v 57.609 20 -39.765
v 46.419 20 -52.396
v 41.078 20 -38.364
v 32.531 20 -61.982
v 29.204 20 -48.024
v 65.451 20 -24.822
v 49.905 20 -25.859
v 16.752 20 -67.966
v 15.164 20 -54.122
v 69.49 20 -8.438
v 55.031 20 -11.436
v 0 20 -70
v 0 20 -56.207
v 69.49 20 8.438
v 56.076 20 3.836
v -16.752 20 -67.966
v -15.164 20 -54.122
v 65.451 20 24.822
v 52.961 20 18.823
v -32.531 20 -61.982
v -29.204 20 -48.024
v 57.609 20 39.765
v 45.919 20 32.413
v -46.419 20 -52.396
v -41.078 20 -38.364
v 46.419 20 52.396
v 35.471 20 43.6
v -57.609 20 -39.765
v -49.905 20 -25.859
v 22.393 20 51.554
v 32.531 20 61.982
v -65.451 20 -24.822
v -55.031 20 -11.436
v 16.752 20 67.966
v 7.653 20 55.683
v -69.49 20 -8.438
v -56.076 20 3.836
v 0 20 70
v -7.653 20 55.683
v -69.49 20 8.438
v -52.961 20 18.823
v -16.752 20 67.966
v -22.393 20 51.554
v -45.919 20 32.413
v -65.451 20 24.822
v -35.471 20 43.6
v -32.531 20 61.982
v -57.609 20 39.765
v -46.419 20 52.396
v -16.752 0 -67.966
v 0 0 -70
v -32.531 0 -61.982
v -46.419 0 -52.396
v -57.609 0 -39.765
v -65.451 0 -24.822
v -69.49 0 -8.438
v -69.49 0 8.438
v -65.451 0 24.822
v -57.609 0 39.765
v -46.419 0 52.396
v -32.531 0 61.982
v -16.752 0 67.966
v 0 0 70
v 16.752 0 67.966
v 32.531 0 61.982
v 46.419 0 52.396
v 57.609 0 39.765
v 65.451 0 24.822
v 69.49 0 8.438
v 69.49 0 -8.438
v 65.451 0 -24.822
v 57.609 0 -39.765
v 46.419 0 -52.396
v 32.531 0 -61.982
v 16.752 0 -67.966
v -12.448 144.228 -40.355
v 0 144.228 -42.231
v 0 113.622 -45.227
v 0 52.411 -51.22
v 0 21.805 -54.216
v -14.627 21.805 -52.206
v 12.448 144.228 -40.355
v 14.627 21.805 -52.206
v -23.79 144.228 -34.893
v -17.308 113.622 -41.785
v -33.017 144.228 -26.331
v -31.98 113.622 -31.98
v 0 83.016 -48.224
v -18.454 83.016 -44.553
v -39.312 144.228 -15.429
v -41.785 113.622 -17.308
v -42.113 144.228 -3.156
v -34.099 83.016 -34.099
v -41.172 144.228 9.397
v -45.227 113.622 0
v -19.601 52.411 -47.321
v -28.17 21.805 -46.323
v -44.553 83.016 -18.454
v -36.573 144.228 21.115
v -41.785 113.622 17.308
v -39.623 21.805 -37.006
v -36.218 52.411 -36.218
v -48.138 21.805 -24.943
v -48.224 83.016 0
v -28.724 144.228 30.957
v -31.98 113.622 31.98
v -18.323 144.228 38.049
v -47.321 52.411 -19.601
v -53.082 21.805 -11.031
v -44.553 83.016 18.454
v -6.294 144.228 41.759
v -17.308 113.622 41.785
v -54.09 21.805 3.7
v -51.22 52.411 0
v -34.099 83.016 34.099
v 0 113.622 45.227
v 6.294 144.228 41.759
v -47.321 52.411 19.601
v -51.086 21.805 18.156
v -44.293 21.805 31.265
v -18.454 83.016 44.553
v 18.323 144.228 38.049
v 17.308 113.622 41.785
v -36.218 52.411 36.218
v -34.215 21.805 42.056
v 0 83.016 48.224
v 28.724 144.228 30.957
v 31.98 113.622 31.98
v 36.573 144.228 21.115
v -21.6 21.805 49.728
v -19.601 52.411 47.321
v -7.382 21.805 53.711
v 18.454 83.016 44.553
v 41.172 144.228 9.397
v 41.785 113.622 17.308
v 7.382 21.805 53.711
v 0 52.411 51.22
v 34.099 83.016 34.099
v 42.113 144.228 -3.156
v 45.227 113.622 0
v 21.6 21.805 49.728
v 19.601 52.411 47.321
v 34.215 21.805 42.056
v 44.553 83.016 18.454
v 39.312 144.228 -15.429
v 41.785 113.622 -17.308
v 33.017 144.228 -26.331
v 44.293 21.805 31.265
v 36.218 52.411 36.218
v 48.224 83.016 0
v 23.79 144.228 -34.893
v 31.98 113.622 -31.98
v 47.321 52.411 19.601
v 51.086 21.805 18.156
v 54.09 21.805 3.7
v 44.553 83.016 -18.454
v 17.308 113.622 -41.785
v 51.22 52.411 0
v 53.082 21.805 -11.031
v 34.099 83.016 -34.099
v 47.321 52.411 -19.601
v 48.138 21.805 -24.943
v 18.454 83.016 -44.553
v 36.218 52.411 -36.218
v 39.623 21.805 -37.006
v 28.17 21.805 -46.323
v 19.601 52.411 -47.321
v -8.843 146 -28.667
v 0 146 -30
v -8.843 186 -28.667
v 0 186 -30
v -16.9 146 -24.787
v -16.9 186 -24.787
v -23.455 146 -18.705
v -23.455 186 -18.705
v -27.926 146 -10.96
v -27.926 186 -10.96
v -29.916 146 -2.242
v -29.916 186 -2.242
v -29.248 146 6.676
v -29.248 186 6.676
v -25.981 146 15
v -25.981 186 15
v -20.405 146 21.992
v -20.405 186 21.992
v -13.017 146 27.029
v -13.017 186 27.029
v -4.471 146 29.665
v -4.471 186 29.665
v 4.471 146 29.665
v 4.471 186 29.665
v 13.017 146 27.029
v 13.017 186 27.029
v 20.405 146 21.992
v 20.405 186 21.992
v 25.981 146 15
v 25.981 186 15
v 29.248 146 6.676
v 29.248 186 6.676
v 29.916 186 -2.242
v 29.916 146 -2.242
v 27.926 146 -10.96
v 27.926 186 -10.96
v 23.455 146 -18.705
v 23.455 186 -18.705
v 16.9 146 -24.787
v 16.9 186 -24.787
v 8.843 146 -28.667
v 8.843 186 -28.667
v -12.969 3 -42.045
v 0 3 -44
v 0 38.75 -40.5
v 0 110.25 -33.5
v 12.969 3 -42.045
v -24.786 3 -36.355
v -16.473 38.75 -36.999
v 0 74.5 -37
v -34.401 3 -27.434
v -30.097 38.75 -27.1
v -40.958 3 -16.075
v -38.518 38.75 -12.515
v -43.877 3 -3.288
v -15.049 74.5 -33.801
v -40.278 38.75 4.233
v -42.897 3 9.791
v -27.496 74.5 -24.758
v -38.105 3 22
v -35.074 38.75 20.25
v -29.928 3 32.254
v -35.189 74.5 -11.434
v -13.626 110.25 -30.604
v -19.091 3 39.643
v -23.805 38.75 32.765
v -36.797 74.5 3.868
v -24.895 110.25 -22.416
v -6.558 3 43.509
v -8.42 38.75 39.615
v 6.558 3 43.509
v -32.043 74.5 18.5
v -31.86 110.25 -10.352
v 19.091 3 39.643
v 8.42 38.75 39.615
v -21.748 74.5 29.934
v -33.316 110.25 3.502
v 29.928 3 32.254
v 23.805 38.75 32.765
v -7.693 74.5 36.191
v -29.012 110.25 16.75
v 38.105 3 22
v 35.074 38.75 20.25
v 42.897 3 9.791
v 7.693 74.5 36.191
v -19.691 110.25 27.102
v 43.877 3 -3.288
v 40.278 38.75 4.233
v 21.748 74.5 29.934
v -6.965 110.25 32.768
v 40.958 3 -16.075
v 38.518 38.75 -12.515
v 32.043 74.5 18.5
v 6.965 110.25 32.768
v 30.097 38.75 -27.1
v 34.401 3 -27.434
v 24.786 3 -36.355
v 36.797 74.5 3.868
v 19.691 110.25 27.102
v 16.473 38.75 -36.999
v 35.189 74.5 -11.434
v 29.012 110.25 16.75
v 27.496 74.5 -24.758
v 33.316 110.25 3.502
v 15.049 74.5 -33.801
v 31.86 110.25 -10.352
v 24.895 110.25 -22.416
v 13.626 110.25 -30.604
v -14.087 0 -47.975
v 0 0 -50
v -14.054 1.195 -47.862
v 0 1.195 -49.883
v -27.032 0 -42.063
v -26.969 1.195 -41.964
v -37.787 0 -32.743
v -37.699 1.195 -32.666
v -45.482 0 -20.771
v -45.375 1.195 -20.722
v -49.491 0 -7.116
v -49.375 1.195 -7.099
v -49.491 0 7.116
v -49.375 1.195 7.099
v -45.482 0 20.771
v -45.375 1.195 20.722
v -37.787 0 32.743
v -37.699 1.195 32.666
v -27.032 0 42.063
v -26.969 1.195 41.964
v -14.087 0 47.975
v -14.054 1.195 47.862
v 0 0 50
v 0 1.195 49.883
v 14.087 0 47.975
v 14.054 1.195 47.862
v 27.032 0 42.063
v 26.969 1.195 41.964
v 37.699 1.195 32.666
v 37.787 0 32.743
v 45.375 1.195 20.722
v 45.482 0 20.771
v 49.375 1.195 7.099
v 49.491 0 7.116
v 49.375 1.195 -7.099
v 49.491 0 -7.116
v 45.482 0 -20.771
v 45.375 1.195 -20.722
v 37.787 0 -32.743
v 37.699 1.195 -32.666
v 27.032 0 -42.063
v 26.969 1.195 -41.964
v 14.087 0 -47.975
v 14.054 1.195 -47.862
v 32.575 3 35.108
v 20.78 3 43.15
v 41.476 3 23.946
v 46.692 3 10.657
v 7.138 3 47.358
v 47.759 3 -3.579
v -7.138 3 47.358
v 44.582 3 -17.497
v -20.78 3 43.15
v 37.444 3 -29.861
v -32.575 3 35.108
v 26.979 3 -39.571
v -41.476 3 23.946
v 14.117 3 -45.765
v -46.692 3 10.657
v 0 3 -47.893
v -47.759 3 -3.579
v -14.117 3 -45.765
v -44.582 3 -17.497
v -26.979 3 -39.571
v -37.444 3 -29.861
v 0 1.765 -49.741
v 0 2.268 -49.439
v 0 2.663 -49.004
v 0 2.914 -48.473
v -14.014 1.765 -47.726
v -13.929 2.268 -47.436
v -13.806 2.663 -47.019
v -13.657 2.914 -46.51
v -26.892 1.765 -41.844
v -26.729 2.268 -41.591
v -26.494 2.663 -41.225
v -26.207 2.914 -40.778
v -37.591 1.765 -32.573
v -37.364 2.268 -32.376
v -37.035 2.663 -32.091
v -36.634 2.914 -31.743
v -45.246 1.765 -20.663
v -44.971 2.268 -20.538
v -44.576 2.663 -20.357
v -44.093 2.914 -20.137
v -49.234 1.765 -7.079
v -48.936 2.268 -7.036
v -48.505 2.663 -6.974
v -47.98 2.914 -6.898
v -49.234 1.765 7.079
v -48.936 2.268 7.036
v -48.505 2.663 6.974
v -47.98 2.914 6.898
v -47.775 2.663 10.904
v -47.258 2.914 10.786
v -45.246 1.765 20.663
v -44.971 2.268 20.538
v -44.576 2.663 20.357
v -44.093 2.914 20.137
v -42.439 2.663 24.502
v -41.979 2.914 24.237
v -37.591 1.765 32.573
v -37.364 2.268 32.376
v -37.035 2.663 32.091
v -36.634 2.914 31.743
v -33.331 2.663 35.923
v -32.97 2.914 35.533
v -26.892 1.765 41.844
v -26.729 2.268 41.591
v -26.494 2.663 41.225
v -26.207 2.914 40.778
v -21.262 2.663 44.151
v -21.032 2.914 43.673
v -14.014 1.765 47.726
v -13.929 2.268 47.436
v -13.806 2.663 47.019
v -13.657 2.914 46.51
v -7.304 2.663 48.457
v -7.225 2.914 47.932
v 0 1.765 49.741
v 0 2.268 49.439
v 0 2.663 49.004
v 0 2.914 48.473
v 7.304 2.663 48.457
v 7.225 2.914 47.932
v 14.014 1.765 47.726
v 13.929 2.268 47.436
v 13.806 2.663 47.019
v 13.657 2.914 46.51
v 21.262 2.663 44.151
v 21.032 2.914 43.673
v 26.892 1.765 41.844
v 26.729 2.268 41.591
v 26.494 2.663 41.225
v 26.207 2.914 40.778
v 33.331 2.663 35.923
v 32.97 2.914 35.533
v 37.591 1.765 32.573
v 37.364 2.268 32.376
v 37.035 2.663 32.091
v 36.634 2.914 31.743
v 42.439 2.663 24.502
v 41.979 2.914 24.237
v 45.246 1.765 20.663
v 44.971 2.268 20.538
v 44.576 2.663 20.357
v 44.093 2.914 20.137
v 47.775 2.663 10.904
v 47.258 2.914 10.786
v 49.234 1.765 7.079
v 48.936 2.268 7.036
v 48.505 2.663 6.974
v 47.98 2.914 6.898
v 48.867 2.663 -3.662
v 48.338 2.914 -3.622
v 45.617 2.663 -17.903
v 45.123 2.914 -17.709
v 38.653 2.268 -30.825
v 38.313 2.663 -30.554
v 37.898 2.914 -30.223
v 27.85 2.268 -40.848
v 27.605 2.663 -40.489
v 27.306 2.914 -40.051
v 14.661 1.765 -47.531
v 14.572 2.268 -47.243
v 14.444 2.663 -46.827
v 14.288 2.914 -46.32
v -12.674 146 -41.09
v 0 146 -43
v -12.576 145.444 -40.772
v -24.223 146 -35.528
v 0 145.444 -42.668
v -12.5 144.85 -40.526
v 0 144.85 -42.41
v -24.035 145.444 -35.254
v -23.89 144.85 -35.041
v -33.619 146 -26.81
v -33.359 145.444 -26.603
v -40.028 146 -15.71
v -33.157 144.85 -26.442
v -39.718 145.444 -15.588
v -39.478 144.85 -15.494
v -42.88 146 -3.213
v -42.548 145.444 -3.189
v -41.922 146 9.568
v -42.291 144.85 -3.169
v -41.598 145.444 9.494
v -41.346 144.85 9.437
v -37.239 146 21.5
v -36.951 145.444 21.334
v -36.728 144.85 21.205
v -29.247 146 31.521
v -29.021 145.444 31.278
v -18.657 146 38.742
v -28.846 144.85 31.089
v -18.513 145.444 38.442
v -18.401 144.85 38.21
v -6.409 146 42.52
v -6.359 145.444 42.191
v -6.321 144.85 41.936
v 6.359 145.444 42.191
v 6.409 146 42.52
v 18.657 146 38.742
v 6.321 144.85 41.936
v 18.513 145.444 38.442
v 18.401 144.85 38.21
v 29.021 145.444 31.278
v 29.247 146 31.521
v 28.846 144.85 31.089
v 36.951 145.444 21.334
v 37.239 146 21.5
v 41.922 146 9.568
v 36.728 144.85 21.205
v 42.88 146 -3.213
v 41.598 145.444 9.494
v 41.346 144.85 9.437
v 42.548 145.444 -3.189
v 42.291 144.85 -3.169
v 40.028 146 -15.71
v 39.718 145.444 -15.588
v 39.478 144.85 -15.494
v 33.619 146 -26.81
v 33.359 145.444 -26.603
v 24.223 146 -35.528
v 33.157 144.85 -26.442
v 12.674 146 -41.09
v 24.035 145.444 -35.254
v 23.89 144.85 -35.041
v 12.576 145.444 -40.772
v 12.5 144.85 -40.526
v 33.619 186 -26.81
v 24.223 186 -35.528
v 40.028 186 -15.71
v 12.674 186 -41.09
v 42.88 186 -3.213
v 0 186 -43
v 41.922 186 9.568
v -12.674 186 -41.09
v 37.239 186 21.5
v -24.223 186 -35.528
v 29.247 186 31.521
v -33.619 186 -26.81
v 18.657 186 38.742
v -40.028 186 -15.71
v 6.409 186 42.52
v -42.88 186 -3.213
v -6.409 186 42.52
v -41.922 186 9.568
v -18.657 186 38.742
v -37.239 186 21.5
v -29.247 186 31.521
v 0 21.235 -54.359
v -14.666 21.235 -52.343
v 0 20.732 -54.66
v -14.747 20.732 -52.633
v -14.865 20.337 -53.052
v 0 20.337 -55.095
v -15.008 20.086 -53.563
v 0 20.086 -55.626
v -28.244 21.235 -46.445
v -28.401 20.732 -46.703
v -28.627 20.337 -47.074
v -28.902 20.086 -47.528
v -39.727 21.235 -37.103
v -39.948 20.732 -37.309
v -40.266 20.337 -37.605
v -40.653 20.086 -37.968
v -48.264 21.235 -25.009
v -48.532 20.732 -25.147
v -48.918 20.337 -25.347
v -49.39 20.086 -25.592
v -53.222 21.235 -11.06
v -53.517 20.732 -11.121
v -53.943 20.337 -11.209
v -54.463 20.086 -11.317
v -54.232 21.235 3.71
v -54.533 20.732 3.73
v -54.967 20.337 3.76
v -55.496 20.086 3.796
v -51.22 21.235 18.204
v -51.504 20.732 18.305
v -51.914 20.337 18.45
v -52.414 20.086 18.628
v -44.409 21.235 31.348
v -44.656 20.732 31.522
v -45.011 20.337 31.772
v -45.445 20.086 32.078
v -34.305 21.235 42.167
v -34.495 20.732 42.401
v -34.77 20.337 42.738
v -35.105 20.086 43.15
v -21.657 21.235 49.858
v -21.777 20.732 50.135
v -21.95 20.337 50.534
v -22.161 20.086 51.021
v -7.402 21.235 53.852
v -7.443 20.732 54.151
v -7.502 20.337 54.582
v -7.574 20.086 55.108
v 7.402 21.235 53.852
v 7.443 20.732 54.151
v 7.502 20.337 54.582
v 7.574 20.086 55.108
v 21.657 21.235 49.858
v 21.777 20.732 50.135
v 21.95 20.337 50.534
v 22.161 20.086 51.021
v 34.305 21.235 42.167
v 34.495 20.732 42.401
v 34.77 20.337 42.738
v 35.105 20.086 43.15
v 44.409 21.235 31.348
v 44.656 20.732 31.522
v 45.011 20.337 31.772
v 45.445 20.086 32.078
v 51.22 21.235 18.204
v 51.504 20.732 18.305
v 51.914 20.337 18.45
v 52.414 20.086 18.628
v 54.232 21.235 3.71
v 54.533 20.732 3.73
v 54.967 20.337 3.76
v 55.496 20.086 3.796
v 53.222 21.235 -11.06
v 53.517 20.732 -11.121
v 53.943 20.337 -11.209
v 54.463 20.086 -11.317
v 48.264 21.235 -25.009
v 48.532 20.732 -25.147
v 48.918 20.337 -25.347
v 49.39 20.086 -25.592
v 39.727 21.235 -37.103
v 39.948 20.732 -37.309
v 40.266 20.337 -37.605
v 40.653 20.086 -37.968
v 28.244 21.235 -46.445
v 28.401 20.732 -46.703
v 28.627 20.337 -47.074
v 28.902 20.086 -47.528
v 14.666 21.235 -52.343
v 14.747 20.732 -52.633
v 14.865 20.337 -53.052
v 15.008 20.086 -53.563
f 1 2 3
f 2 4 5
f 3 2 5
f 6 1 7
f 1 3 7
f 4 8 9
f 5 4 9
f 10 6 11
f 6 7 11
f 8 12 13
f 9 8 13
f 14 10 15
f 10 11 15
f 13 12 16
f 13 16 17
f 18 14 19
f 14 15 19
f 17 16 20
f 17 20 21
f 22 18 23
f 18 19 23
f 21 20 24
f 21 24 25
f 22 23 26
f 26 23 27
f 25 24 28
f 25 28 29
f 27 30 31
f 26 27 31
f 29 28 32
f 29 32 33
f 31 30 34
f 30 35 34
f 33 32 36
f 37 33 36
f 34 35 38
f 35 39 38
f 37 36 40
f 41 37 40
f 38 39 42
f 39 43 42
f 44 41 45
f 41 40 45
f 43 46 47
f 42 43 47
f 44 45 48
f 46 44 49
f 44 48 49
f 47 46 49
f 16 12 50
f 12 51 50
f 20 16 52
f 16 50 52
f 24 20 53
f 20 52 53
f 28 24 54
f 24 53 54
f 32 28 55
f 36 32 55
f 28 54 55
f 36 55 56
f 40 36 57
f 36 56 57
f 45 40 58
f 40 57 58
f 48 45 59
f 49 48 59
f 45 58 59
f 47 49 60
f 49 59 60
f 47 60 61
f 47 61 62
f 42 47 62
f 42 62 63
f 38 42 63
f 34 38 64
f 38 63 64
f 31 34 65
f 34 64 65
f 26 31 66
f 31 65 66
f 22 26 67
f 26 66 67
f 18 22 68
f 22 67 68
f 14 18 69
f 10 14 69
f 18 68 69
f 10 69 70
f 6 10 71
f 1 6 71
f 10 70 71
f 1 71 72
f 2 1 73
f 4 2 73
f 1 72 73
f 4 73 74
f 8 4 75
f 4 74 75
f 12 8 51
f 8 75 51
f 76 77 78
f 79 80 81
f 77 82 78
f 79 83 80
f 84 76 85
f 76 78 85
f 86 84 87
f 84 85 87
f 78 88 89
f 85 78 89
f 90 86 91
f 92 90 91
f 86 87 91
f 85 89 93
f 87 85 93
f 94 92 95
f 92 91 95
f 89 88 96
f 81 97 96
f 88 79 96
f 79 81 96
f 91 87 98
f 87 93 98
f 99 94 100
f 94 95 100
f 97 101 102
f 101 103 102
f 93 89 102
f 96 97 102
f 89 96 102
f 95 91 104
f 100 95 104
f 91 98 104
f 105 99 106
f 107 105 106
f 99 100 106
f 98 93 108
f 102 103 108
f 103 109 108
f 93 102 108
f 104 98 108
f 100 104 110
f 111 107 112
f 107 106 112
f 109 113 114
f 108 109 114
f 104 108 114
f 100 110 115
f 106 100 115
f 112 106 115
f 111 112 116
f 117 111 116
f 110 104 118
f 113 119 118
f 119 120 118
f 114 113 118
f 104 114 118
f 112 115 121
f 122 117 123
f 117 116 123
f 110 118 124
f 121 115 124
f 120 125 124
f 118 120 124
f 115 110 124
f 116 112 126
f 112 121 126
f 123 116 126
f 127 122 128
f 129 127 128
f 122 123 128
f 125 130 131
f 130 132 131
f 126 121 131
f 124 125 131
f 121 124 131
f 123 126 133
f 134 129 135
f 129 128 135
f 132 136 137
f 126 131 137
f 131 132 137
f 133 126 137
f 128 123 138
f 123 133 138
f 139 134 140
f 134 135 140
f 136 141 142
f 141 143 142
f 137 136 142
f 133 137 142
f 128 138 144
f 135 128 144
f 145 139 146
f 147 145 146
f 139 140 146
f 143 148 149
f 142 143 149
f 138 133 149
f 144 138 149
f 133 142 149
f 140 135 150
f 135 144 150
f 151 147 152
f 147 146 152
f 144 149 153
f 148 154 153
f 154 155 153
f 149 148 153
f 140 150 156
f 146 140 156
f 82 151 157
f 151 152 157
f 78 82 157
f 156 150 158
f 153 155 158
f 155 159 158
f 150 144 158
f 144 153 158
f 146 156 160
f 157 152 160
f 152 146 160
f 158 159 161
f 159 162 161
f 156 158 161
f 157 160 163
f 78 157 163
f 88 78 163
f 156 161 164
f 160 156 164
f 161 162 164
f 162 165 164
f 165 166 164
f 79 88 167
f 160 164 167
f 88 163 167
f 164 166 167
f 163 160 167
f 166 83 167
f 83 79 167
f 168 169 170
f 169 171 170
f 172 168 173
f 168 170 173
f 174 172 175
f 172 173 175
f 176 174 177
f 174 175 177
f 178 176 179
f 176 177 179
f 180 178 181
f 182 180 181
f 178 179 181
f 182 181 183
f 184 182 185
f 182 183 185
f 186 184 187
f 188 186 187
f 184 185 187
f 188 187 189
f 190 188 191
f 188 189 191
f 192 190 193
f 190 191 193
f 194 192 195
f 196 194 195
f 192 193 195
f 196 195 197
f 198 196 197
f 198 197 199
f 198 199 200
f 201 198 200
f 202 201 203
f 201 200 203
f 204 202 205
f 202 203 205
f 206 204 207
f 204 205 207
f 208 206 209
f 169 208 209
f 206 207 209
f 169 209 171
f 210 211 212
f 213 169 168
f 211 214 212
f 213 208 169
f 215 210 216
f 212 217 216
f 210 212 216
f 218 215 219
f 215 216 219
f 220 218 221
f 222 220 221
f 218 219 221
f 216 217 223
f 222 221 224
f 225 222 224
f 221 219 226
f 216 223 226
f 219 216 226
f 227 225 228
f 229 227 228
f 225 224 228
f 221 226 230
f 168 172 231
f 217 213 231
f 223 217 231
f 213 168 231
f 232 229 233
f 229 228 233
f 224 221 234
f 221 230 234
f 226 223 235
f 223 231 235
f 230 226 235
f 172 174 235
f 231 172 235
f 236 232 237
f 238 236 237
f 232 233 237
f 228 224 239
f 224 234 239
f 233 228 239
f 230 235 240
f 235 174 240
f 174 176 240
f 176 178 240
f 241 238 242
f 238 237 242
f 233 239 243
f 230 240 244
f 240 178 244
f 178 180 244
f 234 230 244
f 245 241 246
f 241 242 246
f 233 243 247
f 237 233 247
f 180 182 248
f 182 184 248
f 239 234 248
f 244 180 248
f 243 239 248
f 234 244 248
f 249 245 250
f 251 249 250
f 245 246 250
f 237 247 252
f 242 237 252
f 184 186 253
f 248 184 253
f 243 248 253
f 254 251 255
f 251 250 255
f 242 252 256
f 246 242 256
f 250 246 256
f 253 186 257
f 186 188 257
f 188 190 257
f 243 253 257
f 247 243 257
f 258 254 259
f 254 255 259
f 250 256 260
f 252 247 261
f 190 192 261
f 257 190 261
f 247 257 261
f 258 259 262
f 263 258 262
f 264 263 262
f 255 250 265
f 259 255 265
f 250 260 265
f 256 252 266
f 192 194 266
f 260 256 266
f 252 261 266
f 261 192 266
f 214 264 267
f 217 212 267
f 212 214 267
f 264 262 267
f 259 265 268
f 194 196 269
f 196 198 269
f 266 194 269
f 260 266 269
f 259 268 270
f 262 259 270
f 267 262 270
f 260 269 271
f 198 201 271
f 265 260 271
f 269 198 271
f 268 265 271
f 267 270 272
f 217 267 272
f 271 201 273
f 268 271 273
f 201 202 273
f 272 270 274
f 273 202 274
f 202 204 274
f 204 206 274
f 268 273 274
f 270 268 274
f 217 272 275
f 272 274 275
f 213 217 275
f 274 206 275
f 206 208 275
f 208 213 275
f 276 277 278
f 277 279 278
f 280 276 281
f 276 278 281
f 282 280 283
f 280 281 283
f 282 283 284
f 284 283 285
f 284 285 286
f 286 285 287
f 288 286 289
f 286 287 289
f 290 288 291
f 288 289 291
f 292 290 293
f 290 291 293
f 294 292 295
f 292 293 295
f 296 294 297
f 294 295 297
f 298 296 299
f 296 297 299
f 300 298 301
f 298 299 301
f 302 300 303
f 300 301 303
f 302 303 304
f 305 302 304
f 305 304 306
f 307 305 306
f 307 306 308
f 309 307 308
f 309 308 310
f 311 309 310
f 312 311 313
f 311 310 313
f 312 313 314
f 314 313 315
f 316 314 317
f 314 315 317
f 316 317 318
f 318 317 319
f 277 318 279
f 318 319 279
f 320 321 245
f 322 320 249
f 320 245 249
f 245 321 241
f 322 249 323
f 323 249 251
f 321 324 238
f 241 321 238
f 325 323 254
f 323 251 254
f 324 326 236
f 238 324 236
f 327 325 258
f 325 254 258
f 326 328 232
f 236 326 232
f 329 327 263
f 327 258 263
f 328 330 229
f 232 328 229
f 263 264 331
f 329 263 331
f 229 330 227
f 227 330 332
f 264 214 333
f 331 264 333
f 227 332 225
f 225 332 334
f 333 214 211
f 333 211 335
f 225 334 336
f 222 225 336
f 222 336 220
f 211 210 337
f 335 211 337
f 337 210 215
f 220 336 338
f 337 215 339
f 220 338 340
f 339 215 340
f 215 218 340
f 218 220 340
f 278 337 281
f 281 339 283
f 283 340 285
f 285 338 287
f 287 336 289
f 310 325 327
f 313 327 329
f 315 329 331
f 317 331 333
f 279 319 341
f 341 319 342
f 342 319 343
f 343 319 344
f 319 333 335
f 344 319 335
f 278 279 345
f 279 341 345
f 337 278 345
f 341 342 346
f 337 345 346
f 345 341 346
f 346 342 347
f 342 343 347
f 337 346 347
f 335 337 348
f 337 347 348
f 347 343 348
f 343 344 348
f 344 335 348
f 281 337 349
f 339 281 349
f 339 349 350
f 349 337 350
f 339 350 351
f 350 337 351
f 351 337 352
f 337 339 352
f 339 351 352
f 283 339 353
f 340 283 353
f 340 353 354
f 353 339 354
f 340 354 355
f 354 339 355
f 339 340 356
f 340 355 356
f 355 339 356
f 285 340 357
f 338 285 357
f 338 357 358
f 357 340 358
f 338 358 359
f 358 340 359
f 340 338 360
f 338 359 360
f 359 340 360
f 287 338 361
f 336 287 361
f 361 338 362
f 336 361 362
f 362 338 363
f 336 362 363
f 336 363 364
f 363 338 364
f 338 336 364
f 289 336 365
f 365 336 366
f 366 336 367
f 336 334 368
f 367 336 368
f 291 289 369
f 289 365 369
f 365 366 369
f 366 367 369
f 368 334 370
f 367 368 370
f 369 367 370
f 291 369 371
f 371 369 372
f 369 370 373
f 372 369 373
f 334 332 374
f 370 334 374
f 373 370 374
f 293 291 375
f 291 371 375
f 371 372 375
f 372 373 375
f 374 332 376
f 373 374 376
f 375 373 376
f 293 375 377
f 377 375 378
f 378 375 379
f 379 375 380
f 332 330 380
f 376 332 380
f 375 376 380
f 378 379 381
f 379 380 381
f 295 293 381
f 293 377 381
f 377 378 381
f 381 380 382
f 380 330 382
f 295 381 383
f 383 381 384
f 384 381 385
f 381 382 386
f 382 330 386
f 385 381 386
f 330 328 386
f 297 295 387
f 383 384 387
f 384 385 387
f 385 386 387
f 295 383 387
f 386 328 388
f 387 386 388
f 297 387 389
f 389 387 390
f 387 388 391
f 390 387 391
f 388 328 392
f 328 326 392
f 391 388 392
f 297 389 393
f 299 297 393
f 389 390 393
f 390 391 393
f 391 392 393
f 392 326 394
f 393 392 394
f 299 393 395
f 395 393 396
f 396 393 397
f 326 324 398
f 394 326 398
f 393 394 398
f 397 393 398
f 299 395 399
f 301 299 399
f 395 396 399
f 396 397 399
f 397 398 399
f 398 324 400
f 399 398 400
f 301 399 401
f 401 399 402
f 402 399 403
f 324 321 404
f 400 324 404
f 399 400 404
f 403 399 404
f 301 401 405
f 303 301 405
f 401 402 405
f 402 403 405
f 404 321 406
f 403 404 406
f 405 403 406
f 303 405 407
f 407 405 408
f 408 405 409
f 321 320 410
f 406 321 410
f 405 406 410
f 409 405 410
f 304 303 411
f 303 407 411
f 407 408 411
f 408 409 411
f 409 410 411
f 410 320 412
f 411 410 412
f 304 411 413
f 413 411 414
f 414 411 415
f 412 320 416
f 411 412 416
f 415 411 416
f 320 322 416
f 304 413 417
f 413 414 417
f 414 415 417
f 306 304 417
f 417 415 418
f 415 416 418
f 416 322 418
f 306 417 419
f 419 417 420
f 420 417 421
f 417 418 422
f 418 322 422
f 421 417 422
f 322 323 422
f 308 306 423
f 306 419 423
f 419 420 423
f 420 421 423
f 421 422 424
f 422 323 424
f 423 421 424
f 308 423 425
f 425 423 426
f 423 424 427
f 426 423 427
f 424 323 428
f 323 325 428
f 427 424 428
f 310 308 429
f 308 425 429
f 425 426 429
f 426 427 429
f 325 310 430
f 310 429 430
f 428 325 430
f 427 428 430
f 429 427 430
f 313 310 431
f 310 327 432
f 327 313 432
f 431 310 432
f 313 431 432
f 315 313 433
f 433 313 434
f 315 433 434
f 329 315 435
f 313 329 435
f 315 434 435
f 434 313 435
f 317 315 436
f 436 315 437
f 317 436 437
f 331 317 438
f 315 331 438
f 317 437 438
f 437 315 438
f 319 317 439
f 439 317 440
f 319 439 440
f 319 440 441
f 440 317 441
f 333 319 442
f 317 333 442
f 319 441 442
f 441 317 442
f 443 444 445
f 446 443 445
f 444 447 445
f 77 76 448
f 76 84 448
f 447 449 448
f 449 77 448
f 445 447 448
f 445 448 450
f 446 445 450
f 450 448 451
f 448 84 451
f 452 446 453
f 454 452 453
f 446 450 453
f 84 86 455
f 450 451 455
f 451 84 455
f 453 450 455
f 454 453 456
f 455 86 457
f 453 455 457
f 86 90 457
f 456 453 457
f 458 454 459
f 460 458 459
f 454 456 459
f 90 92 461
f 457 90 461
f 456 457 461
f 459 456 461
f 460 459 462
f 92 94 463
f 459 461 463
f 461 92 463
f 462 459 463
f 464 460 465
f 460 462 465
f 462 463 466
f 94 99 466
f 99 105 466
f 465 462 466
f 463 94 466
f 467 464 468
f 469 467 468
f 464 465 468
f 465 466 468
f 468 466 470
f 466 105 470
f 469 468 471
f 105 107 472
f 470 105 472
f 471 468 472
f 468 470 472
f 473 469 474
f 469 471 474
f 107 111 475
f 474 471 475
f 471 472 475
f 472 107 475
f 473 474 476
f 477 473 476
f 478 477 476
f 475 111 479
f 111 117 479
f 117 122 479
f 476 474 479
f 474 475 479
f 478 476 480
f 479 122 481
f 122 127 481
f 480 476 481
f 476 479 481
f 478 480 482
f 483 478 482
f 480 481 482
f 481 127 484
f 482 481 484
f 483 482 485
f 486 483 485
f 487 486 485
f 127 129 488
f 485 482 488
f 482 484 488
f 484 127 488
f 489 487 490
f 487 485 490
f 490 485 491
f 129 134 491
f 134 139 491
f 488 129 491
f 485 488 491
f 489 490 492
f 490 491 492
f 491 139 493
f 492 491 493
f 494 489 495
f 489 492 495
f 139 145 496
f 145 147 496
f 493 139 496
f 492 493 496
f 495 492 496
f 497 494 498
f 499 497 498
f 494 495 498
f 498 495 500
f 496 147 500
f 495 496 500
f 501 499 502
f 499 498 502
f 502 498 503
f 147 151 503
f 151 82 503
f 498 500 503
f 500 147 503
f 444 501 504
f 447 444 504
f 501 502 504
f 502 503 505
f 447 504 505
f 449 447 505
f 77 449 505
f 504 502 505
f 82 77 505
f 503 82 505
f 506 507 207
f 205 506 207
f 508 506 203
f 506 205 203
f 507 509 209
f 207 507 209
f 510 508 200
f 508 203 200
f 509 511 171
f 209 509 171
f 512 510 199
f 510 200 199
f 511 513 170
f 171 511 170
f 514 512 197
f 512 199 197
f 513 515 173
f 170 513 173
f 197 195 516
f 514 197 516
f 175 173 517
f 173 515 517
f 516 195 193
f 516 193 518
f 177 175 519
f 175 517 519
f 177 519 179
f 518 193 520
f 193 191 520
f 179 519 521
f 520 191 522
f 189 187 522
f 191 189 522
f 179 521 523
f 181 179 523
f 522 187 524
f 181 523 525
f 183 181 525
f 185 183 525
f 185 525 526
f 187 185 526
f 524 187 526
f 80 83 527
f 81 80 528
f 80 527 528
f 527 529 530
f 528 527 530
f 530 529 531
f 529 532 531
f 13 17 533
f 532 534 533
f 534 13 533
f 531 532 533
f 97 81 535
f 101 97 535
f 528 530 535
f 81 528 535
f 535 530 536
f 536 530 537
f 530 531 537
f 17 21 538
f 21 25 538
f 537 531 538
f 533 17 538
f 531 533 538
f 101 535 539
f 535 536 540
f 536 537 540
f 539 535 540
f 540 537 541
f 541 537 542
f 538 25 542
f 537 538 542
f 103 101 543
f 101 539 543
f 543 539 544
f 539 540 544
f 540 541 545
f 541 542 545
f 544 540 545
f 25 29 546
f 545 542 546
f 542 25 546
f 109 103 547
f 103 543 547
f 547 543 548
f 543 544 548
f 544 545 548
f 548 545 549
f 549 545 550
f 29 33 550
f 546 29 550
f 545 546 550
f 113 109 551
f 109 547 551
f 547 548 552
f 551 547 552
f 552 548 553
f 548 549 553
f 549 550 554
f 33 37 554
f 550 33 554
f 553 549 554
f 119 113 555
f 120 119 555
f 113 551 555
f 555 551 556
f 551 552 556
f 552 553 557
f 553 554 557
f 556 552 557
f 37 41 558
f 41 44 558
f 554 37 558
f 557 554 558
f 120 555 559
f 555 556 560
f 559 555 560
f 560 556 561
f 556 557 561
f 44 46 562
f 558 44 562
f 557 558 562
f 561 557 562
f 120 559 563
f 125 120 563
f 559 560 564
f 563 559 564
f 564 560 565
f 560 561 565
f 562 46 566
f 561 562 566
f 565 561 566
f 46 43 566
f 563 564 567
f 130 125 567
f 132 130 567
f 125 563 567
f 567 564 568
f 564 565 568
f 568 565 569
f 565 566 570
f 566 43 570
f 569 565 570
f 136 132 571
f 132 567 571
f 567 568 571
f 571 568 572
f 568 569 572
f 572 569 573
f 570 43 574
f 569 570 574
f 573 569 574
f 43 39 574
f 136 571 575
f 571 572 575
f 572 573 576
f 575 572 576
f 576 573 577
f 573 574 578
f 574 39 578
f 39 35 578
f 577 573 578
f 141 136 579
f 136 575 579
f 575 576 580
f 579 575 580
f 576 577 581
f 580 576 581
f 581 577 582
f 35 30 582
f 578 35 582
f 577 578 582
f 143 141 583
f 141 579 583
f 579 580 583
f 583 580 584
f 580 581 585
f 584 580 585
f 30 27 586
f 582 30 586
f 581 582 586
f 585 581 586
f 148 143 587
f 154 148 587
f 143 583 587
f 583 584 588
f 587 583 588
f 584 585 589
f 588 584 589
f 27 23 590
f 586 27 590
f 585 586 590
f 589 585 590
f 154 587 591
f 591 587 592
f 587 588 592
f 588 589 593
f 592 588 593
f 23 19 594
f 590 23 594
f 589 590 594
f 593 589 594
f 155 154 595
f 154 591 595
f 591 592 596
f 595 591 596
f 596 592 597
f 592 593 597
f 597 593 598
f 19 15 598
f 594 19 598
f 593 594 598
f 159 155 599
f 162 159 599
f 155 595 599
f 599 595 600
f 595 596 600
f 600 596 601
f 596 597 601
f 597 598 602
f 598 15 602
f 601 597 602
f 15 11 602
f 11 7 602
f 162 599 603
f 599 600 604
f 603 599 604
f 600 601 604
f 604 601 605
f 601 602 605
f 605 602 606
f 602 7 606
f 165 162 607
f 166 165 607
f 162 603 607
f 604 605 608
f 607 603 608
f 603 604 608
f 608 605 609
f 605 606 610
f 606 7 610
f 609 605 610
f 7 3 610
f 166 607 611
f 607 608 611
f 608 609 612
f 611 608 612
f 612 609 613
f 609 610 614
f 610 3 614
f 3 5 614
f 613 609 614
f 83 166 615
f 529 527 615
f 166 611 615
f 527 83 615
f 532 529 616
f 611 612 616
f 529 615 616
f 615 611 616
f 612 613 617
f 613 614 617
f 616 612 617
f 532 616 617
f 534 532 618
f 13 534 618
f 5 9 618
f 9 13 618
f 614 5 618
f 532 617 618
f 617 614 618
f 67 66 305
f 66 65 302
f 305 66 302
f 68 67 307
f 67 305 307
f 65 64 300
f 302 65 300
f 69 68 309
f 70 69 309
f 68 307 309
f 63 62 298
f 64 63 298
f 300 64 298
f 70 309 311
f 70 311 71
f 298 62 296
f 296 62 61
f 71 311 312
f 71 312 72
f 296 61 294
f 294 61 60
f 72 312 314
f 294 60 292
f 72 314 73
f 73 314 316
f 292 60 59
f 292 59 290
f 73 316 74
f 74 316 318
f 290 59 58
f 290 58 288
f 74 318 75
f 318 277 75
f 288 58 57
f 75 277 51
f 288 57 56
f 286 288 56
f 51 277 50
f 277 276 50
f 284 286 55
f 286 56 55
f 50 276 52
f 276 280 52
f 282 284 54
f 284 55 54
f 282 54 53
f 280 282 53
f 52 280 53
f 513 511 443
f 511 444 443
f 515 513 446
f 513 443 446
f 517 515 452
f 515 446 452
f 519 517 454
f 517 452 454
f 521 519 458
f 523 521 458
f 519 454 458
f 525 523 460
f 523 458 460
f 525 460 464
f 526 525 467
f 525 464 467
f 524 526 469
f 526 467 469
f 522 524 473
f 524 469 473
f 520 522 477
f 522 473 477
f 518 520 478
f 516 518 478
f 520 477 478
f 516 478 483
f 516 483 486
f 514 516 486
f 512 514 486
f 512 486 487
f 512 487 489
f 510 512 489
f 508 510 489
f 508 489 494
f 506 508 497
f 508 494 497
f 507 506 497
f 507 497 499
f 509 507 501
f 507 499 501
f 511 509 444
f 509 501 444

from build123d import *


with BuildPart() as part:
    # Sketch1 → Revolve1 (revolve)
    with BuildSketch(Plane.XY, mode=Mode.PRIVATE) as revolve1_sk:
        with BuildLine():
            Line((30, 186), (43, 186))
            Line((43, 186), (43, 146))
            ThreePointArc((43, 146), (42.529020072, 145.151277561), (42.230898499, 144.22754849))
            Line((42.230898499, 144.22754849), (54.216310346, 21.805127486))
            ThreePointArc((54.216310346, 21.805127486), (54.863243552, 20.518489786), (56.206793881, 20))
            Line((56.206793881, 20), (70, 20))
            Line((70, 20), (70, 0))
            Line((70, 0), (50, 0))
            Line((50, 0), (49.883019474, 1.194872514))
            ThreePointArc((49.883019474, 1.194872514), (49.236086268, 2.481510214), (47.892535939, 3))
            Line((47.892535939, 3), (44, 3))
            Line((44, 3), (30, 146))
            Line((30, 146), (30, 186))
        make_face()
    revolve(revolve1_sk.sketch.rotate(Axis((0, 0, 0), (0, 1, 0)), 90), axis=Axis((0, 0, 0), (0, 1, 0)))


solid = part.part
